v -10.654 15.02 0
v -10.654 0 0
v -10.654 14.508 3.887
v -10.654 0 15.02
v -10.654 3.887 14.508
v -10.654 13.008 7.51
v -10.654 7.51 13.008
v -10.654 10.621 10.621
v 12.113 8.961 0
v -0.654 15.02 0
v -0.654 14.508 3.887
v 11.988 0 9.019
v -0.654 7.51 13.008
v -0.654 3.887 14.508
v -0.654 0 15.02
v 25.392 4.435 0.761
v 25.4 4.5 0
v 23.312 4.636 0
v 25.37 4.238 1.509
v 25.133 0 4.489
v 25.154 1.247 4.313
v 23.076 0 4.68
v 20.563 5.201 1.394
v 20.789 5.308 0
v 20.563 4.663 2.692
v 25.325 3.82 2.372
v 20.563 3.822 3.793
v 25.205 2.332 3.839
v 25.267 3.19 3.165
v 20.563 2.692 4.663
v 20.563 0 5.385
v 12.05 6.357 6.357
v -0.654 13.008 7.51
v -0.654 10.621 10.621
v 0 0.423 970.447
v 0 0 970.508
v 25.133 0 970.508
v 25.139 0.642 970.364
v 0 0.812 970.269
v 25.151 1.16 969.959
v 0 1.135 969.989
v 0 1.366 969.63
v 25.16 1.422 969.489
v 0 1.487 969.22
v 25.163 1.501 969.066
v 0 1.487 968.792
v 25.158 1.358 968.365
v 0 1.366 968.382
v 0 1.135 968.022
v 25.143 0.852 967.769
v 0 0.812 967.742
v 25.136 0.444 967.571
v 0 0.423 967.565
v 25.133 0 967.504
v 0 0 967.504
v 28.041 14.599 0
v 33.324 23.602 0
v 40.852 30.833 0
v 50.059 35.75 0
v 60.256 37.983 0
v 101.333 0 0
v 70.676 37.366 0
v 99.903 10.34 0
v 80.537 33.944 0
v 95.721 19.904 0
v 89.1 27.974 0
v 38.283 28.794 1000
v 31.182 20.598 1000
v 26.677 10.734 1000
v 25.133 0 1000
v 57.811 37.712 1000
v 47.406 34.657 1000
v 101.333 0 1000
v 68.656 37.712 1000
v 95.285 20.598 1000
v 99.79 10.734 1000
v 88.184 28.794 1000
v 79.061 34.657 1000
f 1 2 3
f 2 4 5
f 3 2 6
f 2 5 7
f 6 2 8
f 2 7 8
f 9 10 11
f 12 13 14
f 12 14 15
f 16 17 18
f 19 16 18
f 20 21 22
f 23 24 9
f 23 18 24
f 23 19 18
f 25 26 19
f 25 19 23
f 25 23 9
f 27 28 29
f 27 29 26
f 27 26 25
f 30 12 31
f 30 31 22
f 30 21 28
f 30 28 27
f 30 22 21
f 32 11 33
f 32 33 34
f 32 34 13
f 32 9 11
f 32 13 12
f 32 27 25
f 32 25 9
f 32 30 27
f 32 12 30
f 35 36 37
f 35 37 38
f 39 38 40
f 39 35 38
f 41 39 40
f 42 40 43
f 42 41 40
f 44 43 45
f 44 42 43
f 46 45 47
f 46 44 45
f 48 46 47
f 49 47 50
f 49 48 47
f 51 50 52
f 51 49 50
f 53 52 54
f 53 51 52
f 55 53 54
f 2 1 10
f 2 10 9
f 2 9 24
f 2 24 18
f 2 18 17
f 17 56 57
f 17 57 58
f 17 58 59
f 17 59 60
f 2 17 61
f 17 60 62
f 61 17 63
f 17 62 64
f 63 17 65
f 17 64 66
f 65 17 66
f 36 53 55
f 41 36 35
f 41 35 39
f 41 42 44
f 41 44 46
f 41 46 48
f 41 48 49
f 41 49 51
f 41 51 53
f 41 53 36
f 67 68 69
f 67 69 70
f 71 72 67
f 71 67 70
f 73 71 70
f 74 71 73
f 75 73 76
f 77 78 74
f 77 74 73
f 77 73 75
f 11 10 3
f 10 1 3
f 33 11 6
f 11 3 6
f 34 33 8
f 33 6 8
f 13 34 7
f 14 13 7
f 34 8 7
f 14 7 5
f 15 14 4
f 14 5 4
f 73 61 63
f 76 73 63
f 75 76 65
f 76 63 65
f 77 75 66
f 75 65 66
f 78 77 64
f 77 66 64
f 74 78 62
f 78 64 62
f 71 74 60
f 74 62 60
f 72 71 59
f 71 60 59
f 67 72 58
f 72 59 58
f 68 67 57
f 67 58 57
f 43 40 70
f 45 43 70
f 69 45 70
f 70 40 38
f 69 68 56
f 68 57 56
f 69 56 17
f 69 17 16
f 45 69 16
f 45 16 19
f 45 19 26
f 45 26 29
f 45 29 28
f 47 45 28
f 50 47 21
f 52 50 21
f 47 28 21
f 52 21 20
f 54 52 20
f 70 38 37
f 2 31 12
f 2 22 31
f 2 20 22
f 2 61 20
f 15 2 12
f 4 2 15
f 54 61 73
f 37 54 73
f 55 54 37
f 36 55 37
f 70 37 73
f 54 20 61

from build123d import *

# Parameters (mm, degrees)
REVOLVE3_ANGLE      = 90
BOSS_EXTRUDE2_DEPTH = 1000
BOSS_EXTRUDE4_DEPTH = 50


with BuildPart() as part:
    # Sketch2 → Revolve3 (revolve)
    with BuildSketch(Plane.XY):
        with BuildLine():
            Line((-0.654182434, 15.02), (-10.654182434, 15.02))
            Line((-10.654182434, 15.02), (-10.654182434, 0))
            Line((-10.654182434, 0), (0, 0))
            Line((0, 0), (25.4, 0))
            Line((25.4, 0), (35.4, 0))
            Line((35.4, 0), (35.4, 4.5))
            Line((35.4, 4.5), (25.4, 4.5))
            add(Edge.make_bspline(
                [(-0.654182434, 15.02), (-0.219836229, 14.810704372), (0.610598489, 14.410982375), (2.74095302, 13.386545583), (4.34709547, 12.619135975), (6.701613478, 11.49599419), (8.606916476, 10.59589253), (10.790885987, 9.570629713), (12.810835282, 8.63757915), (14.944119423, 7.669787097), (16.950761864, 6.79193378), (18.75556814, 6.044207346), (20.238794329, 5.486207444), (21.39416777, 5.103578745), (22.215591012, 4.870934478), (22.897035956, 4.710298297), (23.464492683, 4.605633048), (23.954091395, 4.538072471), (24.354277235, 4.503624983), (24.669284768, 4.488813447), (24.918595629, 4.485402054), (25.124701431, 4.488218611), (25.279381224, 4.493757229), (25.359889237, 4.497669109), (25.4, 4.5)],
                knots=[0.083771138, 0.083771138, 0.083771138, 0.083771138, 0.083771138, 0.152014176, 0.220257214, 0.288500251, 0.356743288, 0.424986327, 0.493229366, 0.561472406, 0.629715448, 0.697958493, 0.757156968, 0.791278497, 0.81934393, 0.841893906, 0.858954658, 0.874282948, 0.887931591, 0.900718778, 0.906405686, 0.912092593, 0.917779499, 0.923466404, 0.923466404, 0.923466404, 0.923466404, 0.923466404], degree=4))
        make_face()
    revolve(axis=Axis((0, 0, 0), (1, 0, 0)), revolution_arc=REVOLVE3_ANGLE)

    # Sketch11 → Boss-Extrude2 (add)
    with BuildSketch(Plane.XY):
        with BuildLine():
            Line((25.133318649, 0), (101.333318649, 0))
            ThreePointArc((101.333318649, 0), (63.233318649, 38.1), (25.133318649, 0))
        make_face()
    extrude(amount=BOSS_EXTRUDE2_DEPTH)

    # Sketch16 → Boss-Extrude4 (add)
    with BuildSketch(Plane(origin=(0, 0, 0), x_dir=(0, 0, -1), z_dir=(1, 0, 0))):
        with BuildLine():
            Line((-967.503760297, 0), (-970.507760297, 0))
            ThreePointArc((-970.507760297, 0), (-969.005760297, 1.502), (-967.503760297, 0))
        make_face()
    extrude(amount=BOSS_EXTRUDE4_DEPTH)


solid = part.part
